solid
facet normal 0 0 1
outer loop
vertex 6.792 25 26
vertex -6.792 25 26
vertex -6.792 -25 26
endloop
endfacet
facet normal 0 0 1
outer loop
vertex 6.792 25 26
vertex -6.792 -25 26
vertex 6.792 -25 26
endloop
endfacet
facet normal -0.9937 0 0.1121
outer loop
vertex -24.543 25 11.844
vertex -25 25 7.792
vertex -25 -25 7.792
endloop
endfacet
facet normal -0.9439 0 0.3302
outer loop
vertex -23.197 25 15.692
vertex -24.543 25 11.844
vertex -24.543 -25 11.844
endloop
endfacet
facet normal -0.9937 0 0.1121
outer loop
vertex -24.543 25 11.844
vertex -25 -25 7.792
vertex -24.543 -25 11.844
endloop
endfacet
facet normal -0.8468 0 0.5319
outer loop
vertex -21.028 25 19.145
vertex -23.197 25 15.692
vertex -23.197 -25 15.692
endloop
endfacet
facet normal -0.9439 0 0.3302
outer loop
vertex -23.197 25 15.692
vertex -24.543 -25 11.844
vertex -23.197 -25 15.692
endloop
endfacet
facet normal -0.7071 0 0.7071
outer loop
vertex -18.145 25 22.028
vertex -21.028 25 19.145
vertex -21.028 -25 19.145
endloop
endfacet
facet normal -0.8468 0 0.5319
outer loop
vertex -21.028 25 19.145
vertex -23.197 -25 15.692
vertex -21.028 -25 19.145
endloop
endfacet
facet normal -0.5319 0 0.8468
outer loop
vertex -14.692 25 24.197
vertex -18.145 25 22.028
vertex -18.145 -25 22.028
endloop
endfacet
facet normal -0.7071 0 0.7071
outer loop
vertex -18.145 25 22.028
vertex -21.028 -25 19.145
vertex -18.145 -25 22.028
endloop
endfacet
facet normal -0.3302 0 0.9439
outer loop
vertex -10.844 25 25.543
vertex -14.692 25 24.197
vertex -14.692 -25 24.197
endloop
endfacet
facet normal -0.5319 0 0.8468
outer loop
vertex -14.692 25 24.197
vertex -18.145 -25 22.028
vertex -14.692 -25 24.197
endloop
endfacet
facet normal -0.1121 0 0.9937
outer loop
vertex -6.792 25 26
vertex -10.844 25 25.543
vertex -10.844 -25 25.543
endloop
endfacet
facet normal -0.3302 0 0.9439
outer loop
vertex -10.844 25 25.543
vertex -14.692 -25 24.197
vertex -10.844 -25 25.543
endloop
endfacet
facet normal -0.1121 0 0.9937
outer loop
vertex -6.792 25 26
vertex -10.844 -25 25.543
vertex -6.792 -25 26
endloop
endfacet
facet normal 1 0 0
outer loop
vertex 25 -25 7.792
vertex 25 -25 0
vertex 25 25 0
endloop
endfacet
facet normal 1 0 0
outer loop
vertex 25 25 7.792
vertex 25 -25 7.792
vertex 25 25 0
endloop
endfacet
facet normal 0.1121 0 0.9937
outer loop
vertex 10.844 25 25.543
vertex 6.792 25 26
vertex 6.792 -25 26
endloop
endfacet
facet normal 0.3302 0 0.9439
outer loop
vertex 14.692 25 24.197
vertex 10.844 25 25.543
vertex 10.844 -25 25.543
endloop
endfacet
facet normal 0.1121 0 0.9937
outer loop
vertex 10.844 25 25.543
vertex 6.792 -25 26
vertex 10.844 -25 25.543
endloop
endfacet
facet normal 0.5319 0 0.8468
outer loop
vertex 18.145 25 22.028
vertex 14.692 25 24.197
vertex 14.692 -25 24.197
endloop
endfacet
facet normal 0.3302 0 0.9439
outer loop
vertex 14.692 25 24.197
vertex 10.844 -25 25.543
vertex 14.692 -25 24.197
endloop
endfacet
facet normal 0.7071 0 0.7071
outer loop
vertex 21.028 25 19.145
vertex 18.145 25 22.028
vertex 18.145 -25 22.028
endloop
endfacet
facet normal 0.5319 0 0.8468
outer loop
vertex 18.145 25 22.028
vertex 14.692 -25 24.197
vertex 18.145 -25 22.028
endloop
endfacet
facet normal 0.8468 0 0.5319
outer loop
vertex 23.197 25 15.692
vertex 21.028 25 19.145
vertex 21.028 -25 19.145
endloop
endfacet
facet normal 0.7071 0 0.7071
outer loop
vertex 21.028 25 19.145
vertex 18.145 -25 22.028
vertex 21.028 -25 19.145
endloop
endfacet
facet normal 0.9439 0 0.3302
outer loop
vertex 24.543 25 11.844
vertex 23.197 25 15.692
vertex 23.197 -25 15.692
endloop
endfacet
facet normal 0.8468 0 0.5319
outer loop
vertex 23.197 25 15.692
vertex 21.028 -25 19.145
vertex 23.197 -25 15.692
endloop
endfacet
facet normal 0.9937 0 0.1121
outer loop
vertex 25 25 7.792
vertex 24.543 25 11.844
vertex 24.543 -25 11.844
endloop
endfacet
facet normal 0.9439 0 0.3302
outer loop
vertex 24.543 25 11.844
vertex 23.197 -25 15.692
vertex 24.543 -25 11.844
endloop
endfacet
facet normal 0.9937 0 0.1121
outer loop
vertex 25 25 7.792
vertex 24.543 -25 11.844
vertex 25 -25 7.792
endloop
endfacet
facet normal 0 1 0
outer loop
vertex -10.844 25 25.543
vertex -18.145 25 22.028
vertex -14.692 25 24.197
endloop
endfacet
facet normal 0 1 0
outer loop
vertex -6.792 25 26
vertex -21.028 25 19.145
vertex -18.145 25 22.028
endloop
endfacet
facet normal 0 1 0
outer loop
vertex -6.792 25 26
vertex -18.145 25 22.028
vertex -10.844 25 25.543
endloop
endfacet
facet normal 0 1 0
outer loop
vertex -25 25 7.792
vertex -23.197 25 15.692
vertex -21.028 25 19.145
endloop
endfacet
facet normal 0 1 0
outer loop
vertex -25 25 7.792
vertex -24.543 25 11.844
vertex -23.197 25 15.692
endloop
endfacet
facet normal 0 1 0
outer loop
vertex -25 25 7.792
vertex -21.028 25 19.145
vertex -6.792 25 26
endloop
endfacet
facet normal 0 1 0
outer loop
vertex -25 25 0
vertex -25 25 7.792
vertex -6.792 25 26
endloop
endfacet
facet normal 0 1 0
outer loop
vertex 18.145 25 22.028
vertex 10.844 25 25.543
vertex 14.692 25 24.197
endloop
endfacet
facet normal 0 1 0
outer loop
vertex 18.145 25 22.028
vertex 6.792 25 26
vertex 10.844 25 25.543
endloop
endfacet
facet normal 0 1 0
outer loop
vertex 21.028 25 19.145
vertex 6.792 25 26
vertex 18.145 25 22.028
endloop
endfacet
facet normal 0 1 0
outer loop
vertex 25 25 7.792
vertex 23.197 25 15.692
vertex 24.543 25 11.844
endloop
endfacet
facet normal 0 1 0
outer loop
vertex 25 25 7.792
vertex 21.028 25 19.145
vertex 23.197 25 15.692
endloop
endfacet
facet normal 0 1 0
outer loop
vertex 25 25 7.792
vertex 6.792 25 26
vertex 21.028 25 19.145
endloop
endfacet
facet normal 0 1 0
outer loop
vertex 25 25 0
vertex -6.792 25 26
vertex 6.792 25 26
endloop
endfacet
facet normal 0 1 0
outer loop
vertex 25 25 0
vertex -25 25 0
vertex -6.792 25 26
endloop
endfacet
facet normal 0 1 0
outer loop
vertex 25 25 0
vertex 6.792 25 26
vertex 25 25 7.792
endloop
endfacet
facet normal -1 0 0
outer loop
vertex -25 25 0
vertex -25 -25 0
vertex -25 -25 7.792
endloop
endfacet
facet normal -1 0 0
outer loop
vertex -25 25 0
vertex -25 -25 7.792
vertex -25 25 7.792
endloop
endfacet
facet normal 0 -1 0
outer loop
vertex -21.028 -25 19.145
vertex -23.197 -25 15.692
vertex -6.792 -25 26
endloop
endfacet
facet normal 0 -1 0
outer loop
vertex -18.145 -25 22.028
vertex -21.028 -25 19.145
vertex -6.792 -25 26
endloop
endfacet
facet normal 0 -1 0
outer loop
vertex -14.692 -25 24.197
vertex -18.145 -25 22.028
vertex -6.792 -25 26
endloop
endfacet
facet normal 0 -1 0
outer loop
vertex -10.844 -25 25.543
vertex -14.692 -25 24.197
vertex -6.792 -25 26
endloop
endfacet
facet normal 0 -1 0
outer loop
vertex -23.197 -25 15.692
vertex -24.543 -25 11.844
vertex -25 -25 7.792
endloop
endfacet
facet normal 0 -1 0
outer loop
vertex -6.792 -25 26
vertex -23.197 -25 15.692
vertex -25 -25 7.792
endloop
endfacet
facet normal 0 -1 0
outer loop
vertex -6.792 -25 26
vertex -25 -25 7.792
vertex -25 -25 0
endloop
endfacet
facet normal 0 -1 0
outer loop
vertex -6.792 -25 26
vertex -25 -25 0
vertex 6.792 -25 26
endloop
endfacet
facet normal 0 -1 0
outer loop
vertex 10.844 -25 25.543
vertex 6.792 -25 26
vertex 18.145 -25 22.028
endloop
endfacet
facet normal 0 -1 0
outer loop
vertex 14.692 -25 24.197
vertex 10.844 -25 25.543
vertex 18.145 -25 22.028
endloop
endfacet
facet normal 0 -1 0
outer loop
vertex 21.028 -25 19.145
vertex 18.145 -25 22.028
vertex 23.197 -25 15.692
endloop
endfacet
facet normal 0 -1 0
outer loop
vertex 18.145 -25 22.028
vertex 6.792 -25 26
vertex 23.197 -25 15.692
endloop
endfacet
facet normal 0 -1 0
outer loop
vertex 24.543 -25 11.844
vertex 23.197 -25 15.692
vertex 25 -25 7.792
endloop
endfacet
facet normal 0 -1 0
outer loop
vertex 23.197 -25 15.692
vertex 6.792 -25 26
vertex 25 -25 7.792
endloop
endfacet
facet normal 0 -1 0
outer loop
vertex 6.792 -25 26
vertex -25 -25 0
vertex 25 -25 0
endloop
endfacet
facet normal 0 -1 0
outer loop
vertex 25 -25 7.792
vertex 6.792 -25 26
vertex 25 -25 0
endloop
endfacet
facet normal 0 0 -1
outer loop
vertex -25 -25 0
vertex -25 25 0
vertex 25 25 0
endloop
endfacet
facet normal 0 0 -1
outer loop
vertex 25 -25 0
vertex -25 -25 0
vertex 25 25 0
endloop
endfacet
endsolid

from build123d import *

# Parameters (mm, degrees)
F0_W     = 50
F0_H     = 50
F1_DEPTH = 26
F3_DEPTH = 50.001


with BuildPart() as f1:
    # F0 (on Top) → F1 (new body)
    with BuildSketch(Plane.XY):
        Rectangle(F0_W, F0_H)
    extrude(amount=F1_DEPTH)

    # F2 (on face) → F3 (cut, through all)
    with BuildSketch(Plane.XZ.offset(25)):
        with BuildLine():
            ThreePointArc((6.792214, 26), (19.667063, 20.667063), (25, 7.792214))
            Line((25, 7.792214), (25, 26))
            Line((25, 26), (6.792214, 26))
        make_face()
        with BuildLine():
            Line((-25, 26), (-25, 7.792214))
            ThreePointArc((-25, 7.792214), (-19.667063, 20.667063), (-6.792214, 26))
            Line((-6.792214, 26), (-25, 26))
        make_face()
    extrude(amount=-F3_DEPTH, mode=Mode.SUBTRACT)


solid = f1.part
